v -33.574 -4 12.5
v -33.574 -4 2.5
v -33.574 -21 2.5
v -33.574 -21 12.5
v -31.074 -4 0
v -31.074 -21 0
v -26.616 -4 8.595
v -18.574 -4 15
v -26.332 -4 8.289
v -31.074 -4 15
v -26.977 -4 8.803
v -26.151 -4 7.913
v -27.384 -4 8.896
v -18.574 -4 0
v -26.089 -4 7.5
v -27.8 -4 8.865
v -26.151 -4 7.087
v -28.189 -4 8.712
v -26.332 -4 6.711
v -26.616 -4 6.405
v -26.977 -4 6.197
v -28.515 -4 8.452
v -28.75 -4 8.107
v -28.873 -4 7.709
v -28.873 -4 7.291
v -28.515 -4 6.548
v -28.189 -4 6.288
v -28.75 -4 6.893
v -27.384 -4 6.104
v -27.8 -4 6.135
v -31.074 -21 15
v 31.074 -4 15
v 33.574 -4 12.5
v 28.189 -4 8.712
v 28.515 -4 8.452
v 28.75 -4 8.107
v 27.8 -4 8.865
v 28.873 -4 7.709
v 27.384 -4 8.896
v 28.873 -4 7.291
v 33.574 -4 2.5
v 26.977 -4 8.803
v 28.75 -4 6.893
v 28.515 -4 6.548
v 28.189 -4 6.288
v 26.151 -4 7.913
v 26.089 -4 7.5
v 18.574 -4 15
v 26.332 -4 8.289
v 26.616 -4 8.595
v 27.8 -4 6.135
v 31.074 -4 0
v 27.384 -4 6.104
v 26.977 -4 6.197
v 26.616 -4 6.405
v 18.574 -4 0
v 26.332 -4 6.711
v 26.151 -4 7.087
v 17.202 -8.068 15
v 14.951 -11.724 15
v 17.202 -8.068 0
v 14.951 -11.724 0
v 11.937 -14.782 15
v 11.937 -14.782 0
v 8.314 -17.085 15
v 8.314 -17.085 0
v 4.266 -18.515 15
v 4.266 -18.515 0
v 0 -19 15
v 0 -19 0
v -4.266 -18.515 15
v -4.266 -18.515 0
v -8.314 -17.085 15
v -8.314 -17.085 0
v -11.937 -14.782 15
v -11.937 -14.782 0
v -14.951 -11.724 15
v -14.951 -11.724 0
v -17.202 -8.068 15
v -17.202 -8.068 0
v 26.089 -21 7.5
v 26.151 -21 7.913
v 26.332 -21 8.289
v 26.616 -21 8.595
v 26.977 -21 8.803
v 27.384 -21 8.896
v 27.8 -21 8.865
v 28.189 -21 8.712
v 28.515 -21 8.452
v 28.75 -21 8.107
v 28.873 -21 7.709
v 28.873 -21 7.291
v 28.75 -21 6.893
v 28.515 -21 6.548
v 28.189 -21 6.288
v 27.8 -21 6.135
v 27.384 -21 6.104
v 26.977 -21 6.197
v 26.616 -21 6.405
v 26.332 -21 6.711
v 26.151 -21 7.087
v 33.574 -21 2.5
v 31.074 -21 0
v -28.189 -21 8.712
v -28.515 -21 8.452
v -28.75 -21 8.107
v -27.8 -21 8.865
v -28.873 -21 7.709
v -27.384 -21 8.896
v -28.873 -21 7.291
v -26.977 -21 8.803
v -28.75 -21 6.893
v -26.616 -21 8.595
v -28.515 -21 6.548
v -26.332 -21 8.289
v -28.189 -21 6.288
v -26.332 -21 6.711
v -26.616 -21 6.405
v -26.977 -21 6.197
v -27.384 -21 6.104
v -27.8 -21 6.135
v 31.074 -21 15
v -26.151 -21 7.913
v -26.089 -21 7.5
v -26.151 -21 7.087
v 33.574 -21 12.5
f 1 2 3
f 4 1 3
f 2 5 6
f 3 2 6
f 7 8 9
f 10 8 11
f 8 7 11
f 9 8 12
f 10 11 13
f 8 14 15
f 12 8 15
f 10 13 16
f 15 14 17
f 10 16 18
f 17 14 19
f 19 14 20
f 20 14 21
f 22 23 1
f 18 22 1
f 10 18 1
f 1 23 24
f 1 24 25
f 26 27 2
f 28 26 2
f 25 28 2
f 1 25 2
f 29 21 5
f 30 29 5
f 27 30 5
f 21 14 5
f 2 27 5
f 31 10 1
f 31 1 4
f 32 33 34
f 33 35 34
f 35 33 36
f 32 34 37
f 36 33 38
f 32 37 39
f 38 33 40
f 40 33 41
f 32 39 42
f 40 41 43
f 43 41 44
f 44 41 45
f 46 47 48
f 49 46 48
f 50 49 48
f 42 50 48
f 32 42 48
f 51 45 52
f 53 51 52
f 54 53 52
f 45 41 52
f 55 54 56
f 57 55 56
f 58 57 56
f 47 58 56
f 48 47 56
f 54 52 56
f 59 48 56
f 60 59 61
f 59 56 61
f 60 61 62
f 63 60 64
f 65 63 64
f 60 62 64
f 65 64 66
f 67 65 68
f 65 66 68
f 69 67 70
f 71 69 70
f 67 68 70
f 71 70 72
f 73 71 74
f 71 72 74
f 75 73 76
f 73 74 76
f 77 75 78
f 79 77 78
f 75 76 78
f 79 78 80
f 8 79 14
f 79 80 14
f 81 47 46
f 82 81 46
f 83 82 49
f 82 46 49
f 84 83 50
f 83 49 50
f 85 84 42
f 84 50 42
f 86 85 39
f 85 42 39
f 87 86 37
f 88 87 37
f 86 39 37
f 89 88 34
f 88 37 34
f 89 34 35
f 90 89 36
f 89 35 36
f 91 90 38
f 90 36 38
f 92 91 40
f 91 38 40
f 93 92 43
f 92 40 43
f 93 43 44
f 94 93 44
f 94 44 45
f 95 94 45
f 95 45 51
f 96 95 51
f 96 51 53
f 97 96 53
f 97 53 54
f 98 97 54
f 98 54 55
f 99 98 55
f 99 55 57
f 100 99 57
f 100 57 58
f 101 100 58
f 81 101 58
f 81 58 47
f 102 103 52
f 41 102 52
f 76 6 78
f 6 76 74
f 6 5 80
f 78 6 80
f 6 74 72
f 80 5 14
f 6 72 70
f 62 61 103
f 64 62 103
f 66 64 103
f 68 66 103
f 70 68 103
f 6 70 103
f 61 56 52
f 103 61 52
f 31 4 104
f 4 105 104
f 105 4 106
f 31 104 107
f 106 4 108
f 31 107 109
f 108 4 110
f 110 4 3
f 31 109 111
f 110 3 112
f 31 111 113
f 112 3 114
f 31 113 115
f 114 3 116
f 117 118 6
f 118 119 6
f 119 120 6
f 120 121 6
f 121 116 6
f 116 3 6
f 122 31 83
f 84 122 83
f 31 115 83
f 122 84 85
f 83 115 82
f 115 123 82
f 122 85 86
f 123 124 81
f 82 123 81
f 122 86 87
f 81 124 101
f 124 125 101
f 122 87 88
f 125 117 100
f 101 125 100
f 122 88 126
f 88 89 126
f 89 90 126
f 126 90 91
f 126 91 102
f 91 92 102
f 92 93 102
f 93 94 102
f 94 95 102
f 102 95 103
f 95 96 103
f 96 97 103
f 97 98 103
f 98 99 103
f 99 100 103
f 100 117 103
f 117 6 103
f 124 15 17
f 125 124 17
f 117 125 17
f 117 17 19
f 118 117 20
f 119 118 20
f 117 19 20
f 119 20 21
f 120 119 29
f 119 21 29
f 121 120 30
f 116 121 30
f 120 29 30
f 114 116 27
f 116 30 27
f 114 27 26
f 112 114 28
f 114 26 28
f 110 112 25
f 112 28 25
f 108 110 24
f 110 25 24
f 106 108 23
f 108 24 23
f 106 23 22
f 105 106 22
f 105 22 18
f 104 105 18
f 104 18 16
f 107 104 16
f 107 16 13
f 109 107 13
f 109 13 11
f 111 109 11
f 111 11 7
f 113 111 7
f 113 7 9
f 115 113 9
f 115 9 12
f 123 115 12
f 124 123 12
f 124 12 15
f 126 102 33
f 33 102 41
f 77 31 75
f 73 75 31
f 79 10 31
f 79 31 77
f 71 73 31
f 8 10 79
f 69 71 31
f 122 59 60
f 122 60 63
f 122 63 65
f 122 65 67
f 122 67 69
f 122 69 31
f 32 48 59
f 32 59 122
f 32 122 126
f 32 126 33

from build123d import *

# Parameters (mm, degrees)
BOSS_EXTRUDE1_DEPTH = 15
CHAMFER1_SIZE       = 2.5
SKETCH2_R           = 1.4
CUT_EXTRUDE1_DEPTH  = 41.512038564


with BuildPart() as part:
    # Sketch1 → Boss-Extrude1 (new body)
    with BuildSketch(Plane.XY):
        with BuildLine():
            Line((-18.574175621, -4), (-33.574175621, -4))
            Line((-33.574175621, -4), (-33.574175621, -21))
            Line((-33.574175621, -21), (33.574175621, -21))
            Line((33.574175621, -21), (33.574175621, -4))
            Line((33.574175621, -4), (18.574175621, -4))
            ThreePointArc((18.574175621, -4), (0, -19), (-18.574175621, -4))
        make_face()
    extrude(amount=BOSS_EXTRUDE1_DEPTH)

    # Chamfer1
    chamfer1_edges = [part.edges().sort_by_distance(p)[0] for p in [
        (-33.574175621, -12.5, 15),
        (33.574175621, -12.5, 15),
        (-33.574175621, -12.5, 0),
        (33.574175621, -12.5, 0),
    ]]
    chamfer(chamfer1_edges, length=CHAMFER1_SIZE)

    # Sketch2 → Cut-Extrude1 (cut, through all)
    with BuildSketch(Plane(origin=(0, -4, 0), x_dir=(1, 0, 0), z_dir=(0, 1, 0))):
        with Locations(Location((27.488644481, -7.5, 0), (0, 0, 180))):
            Circle(SKETCH2_R)
        with Locations((-27.488644481, -7.5)):
            Circle(SKETCH2_R)
    extrude(amount=-CUT_EXTRUDE1_DEPTH, mode=Mode.SUBTRACT)


solid = part.part
